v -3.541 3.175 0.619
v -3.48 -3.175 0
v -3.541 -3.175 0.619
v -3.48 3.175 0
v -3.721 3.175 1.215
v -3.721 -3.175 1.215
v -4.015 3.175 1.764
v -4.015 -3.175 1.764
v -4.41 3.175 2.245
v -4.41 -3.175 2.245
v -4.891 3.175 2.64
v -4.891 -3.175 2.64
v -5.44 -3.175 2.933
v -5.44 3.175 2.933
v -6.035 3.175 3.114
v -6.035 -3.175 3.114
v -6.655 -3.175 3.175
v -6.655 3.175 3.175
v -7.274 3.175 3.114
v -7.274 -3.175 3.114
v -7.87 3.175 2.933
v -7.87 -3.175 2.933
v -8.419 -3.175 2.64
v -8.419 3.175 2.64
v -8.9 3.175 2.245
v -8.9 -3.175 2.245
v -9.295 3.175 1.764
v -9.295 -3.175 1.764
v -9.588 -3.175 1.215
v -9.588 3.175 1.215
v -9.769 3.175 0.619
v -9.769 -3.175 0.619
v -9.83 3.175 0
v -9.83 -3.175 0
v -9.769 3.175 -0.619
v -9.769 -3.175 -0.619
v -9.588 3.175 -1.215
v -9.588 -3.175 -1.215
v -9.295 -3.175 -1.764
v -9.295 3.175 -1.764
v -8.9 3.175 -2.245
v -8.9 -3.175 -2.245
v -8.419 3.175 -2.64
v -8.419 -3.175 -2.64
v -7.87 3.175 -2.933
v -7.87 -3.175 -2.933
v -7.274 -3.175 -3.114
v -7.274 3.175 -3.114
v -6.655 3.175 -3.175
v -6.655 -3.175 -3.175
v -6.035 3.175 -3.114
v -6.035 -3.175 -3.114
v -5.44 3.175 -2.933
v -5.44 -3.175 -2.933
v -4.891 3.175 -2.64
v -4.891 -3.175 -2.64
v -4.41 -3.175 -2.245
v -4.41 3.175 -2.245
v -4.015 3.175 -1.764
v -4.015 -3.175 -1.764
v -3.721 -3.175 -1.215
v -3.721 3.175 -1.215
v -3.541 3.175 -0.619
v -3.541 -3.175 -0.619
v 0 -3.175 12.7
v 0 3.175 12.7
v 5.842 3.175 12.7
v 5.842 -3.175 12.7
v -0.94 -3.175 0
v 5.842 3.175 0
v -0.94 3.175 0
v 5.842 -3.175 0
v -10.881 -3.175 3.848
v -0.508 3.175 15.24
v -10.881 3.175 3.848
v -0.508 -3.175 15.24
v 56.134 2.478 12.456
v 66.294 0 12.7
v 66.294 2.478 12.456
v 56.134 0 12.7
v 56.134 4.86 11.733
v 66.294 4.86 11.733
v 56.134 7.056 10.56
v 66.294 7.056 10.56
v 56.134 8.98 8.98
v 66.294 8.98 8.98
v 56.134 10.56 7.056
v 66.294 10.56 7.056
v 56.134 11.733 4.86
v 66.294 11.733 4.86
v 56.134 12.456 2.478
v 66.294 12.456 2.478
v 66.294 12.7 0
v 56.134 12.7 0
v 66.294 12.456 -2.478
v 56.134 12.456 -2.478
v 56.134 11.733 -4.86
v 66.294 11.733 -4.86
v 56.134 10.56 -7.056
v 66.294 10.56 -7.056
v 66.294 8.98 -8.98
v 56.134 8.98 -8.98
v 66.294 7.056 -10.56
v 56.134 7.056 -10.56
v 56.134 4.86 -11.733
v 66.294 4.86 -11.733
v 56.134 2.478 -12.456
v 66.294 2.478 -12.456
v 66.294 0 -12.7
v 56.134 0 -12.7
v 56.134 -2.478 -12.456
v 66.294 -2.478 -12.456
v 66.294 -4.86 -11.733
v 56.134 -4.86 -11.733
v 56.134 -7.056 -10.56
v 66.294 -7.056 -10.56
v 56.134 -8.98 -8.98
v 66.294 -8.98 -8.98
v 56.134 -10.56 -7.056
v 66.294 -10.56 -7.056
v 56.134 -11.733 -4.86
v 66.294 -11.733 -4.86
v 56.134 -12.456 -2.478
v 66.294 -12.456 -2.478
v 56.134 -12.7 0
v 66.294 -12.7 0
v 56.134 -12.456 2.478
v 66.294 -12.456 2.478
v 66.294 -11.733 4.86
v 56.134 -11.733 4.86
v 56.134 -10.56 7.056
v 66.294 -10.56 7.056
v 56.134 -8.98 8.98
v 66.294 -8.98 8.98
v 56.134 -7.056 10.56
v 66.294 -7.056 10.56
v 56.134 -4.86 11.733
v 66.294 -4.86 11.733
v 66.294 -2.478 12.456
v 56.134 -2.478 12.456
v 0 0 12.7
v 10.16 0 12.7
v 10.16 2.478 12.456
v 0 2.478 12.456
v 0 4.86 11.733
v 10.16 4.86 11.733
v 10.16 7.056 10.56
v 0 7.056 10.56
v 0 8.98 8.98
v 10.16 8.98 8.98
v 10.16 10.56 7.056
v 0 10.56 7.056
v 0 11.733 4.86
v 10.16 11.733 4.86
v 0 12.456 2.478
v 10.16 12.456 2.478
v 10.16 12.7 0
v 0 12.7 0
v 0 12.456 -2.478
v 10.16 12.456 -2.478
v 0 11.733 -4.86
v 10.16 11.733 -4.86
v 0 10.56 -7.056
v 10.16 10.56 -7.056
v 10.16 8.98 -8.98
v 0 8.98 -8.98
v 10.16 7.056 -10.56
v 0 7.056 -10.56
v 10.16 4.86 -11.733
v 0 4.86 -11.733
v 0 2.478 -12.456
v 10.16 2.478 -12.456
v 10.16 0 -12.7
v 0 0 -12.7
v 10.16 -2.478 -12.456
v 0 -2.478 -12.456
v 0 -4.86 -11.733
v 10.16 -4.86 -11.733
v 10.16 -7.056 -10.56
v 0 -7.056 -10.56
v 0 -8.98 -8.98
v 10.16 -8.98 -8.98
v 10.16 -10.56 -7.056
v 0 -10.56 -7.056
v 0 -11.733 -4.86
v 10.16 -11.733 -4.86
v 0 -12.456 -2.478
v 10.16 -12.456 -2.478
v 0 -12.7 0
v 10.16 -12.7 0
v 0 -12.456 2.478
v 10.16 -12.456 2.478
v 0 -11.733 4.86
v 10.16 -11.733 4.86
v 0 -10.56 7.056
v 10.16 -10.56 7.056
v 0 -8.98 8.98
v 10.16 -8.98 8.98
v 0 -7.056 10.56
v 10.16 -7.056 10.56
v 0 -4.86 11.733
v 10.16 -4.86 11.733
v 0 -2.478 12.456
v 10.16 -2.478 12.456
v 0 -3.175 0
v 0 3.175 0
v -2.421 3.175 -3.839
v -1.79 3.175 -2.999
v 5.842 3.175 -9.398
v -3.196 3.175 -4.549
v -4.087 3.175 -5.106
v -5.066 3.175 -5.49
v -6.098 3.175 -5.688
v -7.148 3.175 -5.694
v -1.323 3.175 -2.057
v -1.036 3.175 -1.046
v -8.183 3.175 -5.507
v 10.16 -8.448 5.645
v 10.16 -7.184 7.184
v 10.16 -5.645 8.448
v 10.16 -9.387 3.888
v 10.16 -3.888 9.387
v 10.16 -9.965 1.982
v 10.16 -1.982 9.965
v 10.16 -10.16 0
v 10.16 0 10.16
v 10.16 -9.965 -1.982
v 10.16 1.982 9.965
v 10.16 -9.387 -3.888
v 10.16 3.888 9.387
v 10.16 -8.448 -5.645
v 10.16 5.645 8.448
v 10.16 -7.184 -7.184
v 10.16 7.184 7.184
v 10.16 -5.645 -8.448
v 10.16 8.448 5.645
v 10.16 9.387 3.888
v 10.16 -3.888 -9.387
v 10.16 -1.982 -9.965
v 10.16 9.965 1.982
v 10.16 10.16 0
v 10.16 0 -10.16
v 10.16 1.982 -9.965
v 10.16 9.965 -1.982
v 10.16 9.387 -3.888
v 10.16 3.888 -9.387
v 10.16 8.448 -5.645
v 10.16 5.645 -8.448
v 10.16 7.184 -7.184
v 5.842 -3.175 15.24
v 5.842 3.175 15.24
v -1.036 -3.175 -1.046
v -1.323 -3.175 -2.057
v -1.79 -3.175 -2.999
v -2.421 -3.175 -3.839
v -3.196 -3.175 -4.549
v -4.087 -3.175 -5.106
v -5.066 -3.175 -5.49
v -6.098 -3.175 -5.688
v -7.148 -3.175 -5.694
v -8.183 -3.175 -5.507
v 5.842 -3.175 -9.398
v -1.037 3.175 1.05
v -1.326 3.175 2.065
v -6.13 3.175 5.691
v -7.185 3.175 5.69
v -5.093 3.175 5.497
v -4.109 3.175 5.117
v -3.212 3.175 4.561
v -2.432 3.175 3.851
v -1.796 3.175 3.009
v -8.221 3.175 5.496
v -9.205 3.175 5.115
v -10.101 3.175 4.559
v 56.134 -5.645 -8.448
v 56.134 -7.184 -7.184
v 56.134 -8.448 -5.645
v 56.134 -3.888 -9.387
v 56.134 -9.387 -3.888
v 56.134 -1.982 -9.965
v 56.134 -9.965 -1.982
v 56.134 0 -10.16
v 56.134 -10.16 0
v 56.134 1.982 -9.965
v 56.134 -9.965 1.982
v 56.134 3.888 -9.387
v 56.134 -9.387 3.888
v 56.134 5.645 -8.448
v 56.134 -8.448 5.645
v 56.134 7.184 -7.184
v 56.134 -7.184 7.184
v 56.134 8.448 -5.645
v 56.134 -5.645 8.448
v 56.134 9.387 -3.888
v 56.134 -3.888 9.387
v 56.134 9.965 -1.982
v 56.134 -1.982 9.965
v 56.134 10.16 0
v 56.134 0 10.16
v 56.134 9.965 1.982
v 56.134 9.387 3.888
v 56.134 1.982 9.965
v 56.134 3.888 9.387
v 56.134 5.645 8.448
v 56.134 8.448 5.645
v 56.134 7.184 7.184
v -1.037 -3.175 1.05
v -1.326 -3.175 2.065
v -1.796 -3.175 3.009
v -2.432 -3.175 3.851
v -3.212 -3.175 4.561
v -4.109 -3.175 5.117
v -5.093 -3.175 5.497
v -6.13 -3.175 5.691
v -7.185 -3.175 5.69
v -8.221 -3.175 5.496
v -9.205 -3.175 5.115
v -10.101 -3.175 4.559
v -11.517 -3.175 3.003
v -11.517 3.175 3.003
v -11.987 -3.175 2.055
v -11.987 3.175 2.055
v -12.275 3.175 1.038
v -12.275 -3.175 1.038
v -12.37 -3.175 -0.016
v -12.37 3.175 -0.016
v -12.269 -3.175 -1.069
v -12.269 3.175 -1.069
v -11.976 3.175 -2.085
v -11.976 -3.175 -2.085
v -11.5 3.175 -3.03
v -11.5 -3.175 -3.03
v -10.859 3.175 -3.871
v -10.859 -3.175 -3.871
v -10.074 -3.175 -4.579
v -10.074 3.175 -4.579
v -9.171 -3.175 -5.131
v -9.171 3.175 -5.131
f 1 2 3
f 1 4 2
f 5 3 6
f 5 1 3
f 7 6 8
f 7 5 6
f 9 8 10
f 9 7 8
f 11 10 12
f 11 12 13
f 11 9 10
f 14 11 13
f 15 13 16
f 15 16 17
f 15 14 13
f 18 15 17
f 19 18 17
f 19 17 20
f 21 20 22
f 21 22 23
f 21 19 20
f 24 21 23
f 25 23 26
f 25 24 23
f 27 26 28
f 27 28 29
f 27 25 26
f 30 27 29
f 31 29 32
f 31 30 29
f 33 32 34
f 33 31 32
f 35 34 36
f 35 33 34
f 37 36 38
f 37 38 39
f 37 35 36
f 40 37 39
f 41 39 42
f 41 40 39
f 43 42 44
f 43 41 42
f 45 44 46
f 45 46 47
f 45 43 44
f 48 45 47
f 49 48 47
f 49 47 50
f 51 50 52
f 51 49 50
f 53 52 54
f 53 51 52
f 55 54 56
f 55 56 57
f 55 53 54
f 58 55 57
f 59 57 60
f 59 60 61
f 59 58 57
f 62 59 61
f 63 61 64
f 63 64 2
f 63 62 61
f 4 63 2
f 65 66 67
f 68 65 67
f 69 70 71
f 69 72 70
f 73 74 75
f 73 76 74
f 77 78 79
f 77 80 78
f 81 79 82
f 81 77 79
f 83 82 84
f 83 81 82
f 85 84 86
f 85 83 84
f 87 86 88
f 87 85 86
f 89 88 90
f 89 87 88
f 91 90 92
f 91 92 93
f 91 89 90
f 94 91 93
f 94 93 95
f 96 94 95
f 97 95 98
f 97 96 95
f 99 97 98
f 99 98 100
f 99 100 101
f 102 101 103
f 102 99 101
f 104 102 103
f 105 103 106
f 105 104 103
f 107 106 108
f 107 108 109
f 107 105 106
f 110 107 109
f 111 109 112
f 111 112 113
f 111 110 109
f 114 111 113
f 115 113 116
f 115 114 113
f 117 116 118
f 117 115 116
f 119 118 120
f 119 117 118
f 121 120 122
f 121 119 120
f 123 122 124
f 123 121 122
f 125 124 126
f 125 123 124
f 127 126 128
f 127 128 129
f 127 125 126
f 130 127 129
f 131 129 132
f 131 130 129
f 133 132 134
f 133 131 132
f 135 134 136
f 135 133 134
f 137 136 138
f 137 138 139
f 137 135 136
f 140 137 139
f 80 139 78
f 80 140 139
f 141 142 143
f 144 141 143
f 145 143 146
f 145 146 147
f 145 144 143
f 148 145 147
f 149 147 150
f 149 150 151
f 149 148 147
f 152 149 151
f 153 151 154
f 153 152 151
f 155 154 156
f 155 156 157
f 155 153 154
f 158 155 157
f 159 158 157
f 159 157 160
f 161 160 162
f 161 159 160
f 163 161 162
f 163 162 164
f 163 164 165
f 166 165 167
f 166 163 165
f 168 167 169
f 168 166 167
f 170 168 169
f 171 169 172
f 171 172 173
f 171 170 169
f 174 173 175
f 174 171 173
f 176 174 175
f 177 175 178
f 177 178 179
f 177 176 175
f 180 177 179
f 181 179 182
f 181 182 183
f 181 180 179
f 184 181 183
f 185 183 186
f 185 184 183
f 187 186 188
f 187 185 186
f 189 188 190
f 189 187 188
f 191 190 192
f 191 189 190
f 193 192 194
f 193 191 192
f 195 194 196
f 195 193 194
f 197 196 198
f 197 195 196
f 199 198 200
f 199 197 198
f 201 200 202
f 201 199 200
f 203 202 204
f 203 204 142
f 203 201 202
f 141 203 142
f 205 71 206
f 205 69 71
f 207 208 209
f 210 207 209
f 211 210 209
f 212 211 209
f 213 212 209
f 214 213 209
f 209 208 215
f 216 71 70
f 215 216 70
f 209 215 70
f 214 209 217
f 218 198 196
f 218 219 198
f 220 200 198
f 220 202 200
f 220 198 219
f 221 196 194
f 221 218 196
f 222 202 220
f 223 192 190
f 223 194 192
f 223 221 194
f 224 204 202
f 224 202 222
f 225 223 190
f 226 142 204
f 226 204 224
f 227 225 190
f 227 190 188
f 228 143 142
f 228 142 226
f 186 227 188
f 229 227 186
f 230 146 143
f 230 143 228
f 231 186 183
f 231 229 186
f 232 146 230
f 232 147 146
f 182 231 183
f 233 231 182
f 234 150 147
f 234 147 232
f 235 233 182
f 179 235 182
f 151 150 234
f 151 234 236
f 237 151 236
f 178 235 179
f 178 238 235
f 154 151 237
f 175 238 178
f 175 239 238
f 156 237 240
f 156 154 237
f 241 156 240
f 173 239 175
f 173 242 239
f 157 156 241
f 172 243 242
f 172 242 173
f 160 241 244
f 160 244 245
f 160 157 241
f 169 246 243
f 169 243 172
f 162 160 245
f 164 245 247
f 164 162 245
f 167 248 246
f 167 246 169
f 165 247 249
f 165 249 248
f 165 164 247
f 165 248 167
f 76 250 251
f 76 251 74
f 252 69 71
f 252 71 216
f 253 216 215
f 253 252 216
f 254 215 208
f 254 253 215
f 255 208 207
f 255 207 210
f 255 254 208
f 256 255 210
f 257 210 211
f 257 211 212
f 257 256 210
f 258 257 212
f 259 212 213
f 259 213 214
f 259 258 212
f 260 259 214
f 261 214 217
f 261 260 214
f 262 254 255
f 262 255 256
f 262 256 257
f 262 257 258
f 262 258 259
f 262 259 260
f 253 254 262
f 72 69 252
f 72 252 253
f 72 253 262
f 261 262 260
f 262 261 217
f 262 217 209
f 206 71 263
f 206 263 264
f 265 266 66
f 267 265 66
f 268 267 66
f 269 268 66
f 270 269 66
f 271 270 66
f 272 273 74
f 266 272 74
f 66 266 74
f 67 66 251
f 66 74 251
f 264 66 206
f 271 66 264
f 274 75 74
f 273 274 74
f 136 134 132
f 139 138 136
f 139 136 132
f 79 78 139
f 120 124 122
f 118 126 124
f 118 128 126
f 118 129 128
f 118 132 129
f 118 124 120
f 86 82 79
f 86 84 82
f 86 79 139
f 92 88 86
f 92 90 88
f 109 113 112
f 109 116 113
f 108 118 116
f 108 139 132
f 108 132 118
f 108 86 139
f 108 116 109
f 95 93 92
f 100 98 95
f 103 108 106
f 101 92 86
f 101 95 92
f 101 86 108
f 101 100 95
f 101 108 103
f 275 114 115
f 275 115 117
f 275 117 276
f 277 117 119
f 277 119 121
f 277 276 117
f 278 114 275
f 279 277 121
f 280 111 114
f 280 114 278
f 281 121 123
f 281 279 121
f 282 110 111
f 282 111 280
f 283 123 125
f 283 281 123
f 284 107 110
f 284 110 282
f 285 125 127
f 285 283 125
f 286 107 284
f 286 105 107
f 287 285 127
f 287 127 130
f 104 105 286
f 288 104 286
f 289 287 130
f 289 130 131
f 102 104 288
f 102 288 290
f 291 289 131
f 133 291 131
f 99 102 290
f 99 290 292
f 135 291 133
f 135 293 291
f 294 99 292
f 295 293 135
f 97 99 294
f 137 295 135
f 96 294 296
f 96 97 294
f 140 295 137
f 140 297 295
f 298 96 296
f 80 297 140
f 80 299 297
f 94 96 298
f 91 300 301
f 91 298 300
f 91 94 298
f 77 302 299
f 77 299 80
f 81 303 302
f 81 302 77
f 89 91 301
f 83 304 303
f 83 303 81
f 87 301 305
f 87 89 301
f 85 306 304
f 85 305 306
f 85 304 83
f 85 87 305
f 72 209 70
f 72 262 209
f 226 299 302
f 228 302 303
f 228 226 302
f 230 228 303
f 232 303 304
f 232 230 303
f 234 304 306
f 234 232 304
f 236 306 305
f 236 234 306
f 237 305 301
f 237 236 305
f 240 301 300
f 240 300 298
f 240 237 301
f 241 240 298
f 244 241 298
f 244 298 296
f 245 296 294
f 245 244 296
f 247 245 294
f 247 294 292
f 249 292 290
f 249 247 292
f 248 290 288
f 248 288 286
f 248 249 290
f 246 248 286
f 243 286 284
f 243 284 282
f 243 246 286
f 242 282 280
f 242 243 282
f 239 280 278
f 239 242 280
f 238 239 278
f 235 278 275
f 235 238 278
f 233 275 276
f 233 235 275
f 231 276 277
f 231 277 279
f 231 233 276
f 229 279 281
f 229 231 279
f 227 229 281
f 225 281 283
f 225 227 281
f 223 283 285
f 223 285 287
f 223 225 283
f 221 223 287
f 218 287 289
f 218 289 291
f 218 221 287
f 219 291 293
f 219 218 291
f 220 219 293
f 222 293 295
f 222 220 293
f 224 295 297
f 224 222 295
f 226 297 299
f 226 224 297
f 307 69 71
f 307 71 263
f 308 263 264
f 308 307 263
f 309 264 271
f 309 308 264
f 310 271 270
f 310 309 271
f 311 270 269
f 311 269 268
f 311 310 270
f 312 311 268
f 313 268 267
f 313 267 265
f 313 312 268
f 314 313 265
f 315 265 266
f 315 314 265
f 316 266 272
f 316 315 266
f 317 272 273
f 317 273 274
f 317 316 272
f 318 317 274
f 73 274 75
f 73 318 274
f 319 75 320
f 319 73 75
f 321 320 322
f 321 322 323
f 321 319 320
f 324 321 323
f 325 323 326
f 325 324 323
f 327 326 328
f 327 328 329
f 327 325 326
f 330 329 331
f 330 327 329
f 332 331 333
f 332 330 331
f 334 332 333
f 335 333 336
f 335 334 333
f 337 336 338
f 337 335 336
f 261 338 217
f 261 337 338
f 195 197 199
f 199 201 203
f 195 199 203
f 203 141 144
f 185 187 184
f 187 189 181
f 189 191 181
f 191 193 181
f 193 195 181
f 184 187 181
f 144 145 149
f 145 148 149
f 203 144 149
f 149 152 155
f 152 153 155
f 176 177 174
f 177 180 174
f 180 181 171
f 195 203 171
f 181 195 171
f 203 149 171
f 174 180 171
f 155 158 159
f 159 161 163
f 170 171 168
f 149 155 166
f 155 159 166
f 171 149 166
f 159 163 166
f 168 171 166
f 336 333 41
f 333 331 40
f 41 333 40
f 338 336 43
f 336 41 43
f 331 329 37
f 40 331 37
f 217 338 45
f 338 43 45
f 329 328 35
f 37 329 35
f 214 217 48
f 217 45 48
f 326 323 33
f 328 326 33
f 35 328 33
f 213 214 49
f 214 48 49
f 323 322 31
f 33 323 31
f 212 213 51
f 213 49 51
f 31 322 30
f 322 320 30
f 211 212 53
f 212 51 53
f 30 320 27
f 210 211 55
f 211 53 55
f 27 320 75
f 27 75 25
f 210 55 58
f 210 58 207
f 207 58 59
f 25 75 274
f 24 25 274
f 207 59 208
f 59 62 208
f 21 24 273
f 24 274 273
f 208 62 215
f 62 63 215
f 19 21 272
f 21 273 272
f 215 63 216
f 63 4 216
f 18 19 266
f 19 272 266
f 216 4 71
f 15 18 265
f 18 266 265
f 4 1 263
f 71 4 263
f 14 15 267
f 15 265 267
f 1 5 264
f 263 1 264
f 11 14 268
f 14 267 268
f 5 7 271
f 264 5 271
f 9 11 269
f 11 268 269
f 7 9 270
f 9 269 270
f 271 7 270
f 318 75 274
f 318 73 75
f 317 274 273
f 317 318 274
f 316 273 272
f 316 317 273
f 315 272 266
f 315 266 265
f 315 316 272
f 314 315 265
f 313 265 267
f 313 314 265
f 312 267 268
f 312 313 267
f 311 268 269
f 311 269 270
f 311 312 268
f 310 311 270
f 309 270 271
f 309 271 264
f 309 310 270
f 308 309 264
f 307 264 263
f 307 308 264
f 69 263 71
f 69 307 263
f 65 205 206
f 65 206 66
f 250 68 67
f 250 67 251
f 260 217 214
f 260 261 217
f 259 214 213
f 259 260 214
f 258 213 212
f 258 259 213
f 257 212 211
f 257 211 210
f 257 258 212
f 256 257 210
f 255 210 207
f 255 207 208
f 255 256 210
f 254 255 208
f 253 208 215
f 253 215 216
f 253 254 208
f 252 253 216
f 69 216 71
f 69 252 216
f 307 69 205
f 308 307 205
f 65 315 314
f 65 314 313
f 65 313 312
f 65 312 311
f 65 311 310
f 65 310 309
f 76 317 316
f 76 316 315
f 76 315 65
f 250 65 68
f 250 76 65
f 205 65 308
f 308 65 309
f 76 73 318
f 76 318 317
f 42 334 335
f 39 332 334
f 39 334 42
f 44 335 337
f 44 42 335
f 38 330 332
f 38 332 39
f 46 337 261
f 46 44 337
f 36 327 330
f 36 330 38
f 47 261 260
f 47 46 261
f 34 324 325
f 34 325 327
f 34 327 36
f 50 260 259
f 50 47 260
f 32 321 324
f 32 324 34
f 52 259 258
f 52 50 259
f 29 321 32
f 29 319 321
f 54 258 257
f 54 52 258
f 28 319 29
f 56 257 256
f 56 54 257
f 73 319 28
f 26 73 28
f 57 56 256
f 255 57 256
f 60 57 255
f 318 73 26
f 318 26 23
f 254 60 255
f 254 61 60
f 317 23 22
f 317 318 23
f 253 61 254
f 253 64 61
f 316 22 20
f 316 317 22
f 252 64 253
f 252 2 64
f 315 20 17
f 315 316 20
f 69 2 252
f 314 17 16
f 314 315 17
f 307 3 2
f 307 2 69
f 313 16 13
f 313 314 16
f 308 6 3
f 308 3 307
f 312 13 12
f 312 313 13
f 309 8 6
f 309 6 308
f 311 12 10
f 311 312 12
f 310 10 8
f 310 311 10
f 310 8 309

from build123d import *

# Parameters (mm, degrees)
F0_W     = 5.842
F0_H     = 12.7
F0_R     = 3.175
F2_DEPTH = 3.175
F3_DEPTH = 3.175
F4_DEPTH = 3.175


with BuildPart() as f1:
    # F0 (on Front) → F1 (revolve)
    with BuildSketch(Plane.XZ):
        Polygon((5.842, 12.7), (5.842, 0), (66.294, 0), (66.294, 12.7), (56.134, 12.7), (56.134, 10.16), (10.16, 10.16), (10.16, 12.7), align=None)
        with Locations((2.921, 6.35)):
            Rectangle(F0_W, F0_H)
    revolve(axis=Axis((-3.3274, 0, 0), (-1, 0, 0)))


with BuildPart() as f2:
    # F0 (on Front) → F2 (new body, symmetric)
    with BuildSketch(Plane.XZ):
        with BuildLine():
            ThreePointArc((-8.182663, -5.506983), (-3.195791, -4.549339), (-0.9398, 0))
            ThreePointArc((-0.9398, 0), (-4.591961, 5.329721), (-10.88063, 3.847543))
            ThreePointArc((-10.88063, 3.847543), (-12.145978, -1.583727), (-8.182663, -5.506983))
        make_face()
        with Locations((-6.6548, 0)):
            Circle(F0_R, mode=Mode.SUBTRACT)
    extrude(amount=F2_DEPTH, both=True)


with BuildPart() as f3:
    # F0 (on Front) → F3 (new body, symmetric)
    with BuildSketch(Plane.XZ):
        with BuildLine():
            Line((-0.9398, 0), (0, 0))
            Line((0, 0), (0, 12.7))
            Line((0, 12.7), (5.842, 12.7))
            Line((5.842, 12.7), (5.842, 15.24))
            Line((5.842, 15.24), (-0.508, 15.24))
            Line((-0.508, 15.24), (-10.88063, 3.847543))
            ThreePointArc((-10.88063, 3.847543), (-4.591961, 5.329721), (-0.9398, 0))
        make_face()
    extrude(amount=F3_DEPTH, both=True)


with BuildPart() as f4:
    # F0 (on Front) → F4 (new body, symmetric)
    with BuildSketch(Plane.XZ):
        with BuildLine():
            Line((5.842, 0), (0, 0))
            Line((0, 0), (-0.9398, 0))
            ThreePointArc((-0.9398, 0), (-3.195791, -4.549339), (-8.182663, -5.506983))
            Line((-8.182663, -5.506983), (5.842, -9.398))
            Line((5.842, -9.398), (5.842, 0))
        make_face()
    extrude(amount=F4_DEPTH, both=True)


solid = Compound([f1.part, f2.part, f3.part, f4.part])
